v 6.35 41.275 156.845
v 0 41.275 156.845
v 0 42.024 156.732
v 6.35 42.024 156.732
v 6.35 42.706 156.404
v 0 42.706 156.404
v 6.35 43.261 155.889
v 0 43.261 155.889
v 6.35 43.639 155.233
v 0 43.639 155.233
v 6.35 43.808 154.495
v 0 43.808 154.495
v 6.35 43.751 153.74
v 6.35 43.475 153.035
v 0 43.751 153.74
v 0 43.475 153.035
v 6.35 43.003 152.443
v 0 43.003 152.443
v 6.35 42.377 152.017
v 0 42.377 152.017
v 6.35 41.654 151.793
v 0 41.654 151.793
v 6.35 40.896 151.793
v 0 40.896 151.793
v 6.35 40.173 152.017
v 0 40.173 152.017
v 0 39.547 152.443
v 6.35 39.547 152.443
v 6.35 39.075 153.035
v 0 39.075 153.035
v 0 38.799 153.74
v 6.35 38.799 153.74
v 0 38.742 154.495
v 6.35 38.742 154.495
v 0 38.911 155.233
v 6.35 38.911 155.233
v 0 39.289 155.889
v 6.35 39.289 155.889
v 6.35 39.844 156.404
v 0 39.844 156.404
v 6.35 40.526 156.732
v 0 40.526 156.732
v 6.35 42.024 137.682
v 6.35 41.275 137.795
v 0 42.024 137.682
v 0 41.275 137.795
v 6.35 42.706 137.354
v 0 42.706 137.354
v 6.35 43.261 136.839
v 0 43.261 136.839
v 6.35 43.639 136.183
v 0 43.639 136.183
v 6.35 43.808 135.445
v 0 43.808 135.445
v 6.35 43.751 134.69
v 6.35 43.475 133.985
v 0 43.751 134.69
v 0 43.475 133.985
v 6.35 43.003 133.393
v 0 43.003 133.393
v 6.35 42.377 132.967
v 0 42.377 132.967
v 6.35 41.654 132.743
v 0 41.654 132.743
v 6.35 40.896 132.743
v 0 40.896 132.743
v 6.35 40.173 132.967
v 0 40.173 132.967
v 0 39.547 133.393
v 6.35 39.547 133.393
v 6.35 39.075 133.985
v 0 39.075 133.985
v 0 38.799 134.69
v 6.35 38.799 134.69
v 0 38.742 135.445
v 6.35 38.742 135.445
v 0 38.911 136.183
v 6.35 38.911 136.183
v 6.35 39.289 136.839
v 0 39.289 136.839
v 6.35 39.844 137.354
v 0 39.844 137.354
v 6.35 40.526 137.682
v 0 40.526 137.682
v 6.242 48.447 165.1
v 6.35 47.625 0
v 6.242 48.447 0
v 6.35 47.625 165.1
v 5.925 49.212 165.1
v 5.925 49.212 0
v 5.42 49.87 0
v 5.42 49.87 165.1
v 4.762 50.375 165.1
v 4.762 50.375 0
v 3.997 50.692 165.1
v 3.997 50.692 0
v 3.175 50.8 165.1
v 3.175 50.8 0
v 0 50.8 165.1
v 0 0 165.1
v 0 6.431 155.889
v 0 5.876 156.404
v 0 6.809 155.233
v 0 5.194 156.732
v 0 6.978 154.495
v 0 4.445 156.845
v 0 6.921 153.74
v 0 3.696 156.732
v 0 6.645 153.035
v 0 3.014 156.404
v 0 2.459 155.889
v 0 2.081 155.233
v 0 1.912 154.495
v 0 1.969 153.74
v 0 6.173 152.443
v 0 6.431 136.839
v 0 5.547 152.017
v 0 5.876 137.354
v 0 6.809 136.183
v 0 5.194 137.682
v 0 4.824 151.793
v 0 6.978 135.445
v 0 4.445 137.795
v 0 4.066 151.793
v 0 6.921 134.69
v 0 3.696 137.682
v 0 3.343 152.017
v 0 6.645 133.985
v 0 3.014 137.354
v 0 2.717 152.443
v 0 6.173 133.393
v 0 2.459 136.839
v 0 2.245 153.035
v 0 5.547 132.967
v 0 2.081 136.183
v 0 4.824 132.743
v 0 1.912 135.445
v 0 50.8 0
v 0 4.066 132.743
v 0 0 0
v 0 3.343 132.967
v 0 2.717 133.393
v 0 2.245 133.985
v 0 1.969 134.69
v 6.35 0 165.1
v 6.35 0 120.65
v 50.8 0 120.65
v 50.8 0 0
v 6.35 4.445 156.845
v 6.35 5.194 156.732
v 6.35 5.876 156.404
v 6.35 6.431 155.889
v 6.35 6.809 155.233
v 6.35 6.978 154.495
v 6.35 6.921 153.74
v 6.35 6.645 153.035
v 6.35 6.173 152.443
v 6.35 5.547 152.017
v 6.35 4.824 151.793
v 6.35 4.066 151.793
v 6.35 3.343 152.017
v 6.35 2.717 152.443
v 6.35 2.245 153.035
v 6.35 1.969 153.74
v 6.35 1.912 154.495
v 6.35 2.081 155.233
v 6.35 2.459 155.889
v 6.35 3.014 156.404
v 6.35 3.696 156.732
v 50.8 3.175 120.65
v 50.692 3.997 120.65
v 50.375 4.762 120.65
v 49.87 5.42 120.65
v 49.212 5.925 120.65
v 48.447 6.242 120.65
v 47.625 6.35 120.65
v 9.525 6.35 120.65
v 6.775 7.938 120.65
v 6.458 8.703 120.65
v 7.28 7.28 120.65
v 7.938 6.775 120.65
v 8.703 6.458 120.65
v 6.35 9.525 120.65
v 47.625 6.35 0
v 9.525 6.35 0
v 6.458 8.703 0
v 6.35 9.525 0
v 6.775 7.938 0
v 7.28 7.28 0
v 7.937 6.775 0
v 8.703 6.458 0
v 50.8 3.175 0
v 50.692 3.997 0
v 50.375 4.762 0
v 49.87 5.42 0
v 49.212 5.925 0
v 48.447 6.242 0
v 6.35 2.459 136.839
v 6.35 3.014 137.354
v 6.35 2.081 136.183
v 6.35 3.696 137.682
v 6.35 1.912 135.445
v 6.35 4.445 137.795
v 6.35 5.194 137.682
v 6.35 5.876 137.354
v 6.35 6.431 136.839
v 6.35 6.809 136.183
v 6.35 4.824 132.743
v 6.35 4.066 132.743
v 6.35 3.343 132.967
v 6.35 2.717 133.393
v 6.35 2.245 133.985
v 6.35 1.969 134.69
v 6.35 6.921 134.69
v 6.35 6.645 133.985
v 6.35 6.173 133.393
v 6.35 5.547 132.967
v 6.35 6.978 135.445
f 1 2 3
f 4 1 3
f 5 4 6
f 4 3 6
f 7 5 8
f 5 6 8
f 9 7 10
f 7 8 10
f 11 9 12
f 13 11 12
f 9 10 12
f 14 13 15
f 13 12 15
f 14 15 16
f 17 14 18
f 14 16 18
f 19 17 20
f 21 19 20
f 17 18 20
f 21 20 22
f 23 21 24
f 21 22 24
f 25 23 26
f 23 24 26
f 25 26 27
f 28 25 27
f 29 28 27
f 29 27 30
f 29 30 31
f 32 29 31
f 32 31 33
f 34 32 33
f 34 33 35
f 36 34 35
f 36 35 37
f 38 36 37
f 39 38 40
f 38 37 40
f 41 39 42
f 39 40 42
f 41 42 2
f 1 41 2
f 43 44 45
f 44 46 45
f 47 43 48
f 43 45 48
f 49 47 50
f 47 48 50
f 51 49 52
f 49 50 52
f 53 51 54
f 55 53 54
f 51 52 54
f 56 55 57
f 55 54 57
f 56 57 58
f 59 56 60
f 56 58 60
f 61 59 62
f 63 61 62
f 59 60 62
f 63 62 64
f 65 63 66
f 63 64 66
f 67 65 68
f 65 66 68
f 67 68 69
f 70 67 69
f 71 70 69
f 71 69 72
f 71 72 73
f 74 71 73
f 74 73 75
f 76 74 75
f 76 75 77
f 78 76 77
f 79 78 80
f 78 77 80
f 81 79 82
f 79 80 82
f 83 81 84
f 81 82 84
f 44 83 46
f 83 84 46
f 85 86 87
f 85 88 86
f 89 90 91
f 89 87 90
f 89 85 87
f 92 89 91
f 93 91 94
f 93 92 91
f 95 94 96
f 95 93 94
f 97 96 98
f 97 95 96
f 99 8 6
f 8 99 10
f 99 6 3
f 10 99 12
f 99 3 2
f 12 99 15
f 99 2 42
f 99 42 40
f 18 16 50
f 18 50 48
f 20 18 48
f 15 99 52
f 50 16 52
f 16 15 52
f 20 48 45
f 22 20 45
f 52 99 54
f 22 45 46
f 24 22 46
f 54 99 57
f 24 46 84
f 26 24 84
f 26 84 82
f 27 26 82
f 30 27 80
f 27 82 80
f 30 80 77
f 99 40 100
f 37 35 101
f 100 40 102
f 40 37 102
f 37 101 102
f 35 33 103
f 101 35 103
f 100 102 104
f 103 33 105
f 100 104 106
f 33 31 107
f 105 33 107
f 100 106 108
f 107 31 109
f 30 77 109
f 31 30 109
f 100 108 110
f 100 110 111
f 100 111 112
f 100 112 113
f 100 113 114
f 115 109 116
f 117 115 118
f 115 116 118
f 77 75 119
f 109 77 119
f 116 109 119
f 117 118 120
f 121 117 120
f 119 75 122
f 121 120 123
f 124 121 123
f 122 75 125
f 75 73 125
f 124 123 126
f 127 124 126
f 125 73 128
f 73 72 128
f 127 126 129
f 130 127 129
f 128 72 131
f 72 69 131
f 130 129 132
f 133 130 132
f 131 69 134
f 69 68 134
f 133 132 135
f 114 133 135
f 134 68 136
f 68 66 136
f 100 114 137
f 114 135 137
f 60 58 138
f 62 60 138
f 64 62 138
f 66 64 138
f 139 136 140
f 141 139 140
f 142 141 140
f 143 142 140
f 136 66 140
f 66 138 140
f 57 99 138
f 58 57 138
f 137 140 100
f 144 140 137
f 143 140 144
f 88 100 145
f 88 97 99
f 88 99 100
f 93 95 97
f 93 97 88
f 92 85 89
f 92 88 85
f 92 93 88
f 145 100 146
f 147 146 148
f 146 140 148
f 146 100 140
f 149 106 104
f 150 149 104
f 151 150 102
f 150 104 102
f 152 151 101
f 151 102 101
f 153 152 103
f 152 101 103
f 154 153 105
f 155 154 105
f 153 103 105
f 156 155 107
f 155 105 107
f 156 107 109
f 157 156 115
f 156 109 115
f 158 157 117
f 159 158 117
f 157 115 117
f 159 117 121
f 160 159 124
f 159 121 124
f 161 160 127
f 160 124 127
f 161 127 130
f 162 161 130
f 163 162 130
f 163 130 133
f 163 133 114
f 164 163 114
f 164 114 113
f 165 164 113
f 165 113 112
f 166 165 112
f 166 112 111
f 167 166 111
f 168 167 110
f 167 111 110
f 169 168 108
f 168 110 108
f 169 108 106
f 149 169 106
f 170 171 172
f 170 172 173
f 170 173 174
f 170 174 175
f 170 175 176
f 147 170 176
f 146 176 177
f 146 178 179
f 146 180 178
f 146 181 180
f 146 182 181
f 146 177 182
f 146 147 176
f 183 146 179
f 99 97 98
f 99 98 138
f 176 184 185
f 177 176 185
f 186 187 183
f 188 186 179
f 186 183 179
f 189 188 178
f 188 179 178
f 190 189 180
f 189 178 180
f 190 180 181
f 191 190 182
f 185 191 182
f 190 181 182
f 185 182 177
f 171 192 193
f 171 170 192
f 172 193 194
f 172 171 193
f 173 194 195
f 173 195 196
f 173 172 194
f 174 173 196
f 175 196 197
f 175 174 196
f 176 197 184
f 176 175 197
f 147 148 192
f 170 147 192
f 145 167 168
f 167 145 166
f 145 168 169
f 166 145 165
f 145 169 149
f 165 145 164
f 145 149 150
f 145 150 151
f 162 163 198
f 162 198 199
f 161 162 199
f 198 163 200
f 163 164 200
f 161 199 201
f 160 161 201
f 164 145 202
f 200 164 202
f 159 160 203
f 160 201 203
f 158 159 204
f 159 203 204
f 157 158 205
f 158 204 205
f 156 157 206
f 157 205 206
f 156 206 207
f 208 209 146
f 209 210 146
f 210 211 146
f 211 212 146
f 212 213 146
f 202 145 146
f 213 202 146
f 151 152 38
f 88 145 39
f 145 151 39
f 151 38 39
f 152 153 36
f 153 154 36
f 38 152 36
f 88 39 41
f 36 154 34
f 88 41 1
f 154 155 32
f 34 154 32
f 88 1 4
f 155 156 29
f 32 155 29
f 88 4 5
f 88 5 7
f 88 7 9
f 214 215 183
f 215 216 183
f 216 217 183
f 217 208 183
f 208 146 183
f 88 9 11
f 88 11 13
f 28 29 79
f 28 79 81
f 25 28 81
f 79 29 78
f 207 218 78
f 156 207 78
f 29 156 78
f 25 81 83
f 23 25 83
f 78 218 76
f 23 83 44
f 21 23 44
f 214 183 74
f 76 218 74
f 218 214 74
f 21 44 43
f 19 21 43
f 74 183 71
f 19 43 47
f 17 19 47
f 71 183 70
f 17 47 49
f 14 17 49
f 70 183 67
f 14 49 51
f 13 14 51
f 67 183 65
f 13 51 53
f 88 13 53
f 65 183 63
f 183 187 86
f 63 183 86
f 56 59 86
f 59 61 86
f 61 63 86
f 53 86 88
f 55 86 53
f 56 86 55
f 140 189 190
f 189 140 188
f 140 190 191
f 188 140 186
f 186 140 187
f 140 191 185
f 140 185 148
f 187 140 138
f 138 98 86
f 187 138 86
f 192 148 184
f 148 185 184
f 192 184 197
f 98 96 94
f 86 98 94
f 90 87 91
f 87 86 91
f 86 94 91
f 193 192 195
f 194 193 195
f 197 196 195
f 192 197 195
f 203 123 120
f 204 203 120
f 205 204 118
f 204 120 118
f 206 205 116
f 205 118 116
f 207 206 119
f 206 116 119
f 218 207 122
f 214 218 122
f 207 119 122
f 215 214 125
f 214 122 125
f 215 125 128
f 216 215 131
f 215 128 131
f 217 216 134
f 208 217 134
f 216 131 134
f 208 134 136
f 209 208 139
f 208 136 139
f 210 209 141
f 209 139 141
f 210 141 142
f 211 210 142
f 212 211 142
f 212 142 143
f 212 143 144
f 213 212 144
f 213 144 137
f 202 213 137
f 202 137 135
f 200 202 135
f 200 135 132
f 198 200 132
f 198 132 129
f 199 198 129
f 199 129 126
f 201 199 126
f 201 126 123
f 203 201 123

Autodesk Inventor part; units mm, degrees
ref_plane "YZ Plane" through (0, 0, 0) normal (1, 0, 0) x (0, 1, 0)
ref_plane "XZ Plane" through (0, 0, 0) normal (0, 1, 0) x (-1, 0, 0)
ref_plane "XY Plane" through (0, 0, 0) normal (0, 0, 1) x (1, 0, 0)
sketch "Sketch1" plane through (0, 0, 0) normal (0, 0, 1) x (1, 0, 0)
  line L0 (0, 0) -> (6.35, 0)
  line L1 (6.35, 0) -> (6.35, 50.8)
  line L2 (6.35, 50.8) -> (0, 50.8)
  line L3 (0, 50.8) -> (0, 0)
  line L4 (0, 0) -> (50.8, 0)
  line L5 (50.8, 0) -> (50.8, 6.35)
  line L6 (50.8, 6.35) -> (0, 6.35)
  line L7 (0, 6.35) -> (0, 0)
  dimension "d0" = 6.35
  dimension "d1" = 50.8
  dimension "d2" = 50.8
  dimension "d3" = 6.35
extrude "Extrusion1" add sketch "Sketch1" along normal blind 165.1
fillet "Fillet1" radius 3.175 3 edges at (6.35, 50.8, 82.55) (6.35, 6.35, 82.55) (50.8, 6.35, 82.55)
sketch "Sketch2" plane through (0, 0, 0) normal (0, -1, 0) x (1, 0, 0)
  line L0 (0, 165.1) -> (50.8, 165.1) projected
  line L1 (0, 0) -> (0, 165.1) projected
  line L2 (0, 0) -> (50.8, 0) projected
  line L3 (50.8, 0) -> (50.8, 165.1) projected
  line L4 (50.8, 165.1) -> (50.8, 0) projected
  line L5 (6.35, 165.1) -> (50.8, 165.1)
  line L6 (50.8, 165.1) -> (50.8, 120.65)
  line L7 (50.8, 120.65) -> (6.35, 120.65)
  line L8 (6.35, 120.65) -> (6.35, 165.1)
  dimension "d7" = 44.45
extrude "Extrusion2" cut sketch "Sketch2" against normal blind 165.1 contours L0 L3 L7 L8
sketch "Sketch3" plane through (0, 0, 0) normal (-1, 0, 0) x (0, 0, 1)
  circle A0 centre (135.255, 4.445) radius 2.54 projected
  circle A1 centre (154.305, 4.445) radius 2.54 projected
  circle A2 centre (154.305, 41.275) radius 2.54 projected
  circle A3 centre (135.255, 41.275) radius 2.54 projected
  line L0 (124.46, 45.72) -> (124.46, 0) projected
  line L1 (144.78, 45.72) -> (124.46, 45.72) projected
  line L2 (165.1, 45.72) -> (144.78, 45.72) projected
  line L3 (165.1, 0) -> (165.1, 45.72) projected
  line L4 (124.46, 0) -> (165.1, 0) projected
  point P0 (0, 0)
extrude "Extrusion3" cut sketch "Sketch3" against normal blind 165.1 contours A0 | A1 | A2 | A3
properties part number "lbeam final"
